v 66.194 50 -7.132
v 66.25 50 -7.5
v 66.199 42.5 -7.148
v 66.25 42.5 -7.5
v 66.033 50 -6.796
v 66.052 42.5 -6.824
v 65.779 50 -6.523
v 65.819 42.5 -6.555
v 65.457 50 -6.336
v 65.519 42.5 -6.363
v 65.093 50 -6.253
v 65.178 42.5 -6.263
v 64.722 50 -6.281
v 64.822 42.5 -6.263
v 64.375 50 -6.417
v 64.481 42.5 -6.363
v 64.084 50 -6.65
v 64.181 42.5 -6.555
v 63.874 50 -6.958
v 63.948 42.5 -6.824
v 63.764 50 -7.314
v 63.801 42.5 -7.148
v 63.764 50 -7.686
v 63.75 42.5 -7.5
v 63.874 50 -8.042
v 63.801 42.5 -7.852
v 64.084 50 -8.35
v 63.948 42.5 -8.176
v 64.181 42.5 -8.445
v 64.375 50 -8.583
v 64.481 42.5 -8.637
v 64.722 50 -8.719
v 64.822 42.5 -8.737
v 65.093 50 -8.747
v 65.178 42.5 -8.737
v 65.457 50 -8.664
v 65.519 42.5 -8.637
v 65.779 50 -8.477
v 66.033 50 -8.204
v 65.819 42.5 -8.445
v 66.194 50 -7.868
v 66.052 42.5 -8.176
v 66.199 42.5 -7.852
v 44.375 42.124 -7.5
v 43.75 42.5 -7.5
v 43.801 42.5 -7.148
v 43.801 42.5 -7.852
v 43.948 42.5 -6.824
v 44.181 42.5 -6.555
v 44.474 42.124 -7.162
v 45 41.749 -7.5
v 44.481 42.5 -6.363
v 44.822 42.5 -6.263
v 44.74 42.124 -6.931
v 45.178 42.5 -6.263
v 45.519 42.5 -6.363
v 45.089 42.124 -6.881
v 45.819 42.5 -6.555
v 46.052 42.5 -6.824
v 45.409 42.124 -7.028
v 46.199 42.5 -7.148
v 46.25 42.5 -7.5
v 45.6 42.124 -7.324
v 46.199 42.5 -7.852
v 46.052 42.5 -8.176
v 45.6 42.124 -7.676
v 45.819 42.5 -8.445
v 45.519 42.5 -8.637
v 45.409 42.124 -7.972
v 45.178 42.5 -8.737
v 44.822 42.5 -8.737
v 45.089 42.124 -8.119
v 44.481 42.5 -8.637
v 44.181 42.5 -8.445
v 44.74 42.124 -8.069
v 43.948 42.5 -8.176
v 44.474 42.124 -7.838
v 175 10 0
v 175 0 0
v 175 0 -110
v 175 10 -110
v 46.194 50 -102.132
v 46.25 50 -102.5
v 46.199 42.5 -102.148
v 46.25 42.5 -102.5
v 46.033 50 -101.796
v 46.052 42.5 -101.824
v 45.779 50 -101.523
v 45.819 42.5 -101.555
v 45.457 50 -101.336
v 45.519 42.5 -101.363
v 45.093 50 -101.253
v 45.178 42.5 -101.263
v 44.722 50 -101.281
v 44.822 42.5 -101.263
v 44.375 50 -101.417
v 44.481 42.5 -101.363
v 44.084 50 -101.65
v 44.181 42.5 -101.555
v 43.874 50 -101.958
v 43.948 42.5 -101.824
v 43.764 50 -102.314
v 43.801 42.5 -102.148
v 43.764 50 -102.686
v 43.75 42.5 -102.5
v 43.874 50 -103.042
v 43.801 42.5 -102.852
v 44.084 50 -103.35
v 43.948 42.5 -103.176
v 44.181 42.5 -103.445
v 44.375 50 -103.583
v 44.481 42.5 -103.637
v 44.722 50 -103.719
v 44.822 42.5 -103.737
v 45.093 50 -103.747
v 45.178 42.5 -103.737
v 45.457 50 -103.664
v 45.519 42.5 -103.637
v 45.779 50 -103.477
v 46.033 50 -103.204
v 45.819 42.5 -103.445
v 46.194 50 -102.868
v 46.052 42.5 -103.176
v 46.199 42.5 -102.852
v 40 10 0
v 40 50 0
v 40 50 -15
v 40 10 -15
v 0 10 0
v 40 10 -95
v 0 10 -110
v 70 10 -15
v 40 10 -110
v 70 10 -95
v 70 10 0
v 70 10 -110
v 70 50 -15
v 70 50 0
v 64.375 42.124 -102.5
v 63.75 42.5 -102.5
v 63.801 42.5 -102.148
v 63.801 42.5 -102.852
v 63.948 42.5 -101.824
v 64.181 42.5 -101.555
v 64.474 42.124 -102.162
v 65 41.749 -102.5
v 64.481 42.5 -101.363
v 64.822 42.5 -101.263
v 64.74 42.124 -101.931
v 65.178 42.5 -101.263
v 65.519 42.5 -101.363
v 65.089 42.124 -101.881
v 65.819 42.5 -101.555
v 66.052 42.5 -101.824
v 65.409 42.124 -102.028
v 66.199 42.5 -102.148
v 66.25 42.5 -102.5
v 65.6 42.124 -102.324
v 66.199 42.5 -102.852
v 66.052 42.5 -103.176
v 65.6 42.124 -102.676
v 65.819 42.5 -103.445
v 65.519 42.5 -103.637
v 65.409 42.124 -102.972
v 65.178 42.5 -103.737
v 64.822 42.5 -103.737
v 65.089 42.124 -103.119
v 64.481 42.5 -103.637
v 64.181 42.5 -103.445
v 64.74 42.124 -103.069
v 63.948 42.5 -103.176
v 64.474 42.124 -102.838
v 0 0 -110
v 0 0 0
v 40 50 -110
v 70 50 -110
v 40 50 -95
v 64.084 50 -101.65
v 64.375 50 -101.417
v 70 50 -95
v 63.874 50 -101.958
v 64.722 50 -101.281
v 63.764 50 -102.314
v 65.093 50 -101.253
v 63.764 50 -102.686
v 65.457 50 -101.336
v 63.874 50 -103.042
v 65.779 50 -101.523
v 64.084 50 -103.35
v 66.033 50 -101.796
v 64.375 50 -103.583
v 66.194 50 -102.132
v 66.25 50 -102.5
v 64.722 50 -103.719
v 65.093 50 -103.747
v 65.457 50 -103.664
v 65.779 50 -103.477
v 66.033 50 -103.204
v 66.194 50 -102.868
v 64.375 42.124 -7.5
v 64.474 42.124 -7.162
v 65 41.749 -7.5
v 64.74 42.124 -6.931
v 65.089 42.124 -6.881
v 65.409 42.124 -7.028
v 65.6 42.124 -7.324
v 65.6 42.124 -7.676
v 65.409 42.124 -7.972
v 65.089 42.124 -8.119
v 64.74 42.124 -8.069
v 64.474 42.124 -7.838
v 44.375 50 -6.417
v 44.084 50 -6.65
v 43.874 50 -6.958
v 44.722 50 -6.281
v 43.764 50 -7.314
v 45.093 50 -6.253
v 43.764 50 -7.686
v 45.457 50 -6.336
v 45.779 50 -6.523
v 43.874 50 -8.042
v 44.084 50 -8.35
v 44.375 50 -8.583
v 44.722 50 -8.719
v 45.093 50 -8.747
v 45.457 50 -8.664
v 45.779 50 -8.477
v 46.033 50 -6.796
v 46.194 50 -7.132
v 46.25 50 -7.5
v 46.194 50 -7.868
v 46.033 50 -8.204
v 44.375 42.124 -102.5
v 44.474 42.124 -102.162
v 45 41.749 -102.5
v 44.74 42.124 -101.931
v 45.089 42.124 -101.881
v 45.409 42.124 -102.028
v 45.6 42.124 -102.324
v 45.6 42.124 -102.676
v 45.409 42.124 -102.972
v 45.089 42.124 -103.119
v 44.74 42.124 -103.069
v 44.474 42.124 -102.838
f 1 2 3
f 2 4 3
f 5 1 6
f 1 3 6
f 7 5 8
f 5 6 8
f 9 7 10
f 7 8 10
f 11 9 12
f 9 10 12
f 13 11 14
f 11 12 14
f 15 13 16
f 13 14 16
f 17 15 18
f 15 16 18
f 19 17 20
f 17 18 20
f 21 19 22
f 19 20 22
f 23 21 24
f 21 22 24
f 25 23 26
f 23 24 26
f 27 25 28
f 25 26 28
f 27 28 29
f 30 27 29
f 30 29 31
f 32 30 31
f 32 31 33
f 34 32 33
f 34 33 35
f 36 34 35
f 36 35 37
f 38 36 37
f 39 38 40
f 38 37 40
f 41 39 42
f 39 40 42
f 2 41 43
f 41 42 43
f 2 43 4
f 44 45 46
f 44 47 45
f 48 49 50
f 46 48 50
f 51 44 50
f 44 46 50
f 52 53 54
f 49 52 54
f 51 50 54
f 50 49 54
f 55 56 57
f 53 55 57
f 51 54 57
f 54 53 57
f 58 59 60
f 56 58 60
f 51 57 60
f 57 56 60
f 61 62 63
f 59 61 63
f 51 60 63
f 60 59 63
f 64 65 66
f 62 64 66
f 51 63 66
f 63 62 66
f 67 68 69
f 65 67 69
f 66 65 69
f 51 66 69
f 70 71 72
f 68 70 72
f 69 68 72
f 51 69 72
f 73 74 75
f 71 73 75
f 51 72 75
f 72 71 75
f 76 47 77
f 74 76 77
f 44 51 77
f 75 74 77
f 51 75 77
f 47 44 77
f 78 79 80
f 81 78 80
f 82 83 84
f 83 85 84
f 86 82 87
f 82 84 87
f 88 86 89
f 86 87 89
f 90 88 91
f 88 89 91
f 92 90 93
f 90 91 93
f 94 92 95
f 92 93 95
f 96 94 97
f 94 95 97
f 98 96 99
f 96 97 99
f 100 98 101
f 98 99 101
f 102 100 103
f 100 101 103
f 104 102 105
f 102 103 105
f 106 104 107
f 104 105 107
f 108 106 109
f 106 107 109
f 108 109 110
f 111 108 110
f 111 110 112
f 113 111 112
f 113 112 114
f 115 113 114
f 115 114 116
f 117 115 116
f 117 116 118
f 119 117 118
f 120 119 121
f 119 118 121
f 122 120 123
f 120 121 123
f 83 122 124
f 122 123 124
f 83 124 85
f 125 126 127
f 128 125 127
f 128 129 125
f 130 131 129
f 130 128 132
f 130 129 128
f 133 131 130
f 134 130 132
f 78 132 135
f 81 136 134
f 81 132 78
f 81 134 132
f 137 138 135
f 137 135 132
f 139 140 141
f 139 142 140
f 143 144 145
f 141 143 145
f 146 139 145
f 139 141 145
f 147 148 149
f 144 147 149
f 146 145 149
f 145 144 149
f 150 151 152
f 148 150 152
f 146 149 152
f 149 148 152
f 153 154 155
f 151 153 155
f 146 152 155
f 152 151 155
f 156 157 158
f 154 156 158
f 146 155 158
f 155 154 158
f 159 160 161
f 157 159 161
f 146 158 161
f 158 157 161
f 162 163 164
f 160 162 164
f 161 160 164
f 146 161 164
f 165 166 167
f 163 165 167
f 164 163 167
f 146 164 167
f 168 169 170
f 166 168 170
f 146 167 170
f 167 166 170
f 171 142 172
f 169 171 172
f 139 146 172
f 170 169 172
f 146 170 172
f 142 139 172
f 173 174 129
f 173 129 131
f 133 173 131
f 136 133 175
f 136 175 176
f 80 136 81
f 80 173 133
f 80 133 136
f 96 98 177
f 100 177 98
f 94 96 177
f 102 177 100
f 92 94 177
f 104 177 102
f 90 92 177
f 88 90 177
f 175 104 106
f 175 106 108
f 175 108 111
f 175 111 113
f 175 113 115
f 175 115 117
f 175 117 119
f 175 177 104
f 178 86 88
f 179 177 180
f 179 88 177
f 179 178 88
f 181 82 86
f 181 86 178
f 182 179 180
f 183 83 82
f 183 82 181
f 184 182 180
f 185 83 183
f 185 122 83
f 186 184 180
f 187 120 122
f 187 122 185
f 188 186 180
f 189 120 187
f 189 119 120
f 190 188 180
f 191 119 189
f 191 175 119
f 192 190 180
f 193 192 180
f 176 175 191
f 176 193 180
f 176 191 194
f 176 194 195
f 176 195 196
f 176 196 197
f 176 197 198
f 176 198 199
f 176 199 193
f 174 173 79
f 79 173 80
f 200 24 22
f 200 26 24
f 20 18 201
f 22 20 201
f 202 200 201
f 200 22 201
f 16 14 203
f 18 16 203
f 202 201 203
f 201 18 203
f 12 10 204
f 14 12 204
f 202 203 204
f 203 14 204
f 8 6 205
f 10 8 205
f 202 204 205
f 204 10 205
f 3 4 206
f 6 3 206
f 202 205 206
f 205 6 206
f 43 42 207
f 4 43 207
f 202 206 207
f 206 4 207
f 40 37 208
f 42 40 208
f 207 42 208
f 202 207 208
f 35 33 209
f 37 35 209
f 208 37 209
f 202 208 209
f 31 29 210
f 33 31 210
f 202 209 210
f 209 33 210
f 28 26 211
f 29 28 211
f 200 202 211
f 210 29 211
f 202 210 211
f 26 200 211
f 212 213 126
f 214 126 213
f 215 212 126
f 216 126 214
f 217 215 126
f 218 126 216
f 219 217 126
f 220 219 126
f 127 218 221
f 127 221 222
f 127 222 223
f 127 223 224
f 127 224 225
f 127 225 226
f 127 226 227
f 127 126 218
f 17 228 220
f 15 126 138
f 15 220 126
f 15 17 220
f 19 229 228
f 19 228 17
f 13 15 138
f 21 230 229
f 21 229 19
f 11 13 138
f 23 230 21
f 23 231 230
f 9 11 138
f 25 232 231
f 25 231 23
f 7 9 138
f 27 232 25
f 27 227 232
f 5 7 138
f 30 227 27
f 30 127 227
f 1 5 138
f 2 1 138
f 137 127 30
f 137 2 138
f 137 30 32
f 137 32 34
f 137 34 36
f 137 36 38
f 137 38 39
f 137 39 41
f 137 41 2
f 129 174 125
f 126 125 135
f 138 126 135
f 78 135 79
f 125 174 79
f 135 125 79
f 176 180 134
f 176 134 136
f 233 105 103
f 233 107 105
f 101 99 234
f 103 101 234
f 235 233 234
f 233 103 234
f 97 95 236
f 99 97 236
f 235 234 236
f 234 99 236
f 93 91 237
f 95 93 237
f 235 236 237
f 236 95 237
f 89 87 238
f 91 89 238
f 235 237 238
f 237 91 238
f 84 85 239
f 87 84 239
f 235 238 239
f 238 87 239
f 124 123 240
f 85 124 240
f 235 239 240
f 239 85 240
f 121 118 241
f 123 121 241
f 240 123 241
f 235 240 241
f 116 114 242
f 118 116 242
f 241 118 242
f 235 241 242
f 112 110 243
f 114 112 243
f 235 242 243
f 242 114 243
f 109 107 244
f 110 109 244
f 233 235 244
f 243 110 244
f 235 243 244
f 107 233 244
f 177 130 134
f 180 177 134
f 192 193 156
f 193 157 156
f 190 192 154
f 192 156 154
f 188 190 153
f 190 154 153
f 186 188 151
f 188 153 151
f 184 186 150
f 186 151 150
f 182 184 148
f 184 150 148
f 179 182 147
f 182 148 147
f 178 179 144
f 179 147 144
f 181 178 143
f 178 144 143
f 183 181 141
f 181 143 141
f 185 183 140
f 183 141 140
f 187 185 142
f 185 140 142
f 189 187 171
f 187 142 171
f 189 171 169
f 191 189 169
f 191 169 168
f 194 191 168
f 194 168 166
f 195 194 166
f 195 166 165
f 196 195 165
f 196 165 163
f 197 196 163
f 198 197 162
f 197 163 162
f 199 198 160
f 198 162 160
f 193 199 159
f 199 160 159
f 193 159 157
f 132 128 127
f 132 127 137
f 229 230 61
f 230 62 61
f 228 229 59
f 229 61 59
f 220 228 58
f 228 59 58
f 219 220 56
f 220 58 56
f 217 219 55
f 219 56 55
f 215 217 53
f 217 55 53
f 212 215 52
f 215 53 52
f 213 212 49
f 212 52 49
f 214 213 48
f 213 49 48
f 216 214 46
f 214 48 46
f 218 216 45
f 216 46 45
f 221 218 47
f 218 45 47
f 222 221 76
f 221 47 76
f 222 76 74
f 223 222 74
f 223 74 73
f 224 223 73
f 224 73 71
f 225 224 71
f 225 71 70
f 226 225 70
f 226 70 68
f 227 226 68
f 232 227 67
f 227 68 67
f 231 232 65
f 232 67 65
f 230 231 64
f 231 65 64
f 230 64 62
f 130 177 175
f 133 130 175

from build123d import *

# Parameters (mm, degrees)
SKETCH1_W                 = 175
SKETCH1_H                 = 110
BOSS_EXTRUDE1_DEPTH       = 10
SKETCH3_W                 = 30
SKETCH3_H                 = 15
BOSS_EXTRUDE2_DEPTH       = 40
M3X0_5_TAPPED_HOLE1_D     = 2.5
M3X0_5_TAPPED_HOLE1_DEPTH = 7.5
M3X0_5_TAPPED_HOLE1_TIP   = 0.751075774


with BuildPart() as part:
    # Sketch1 → Boss-Extrude1 (new body)
    with BuildSketch(Plane(origin=(0, 0, 0), x_dir=(1, 0, 0), z_dir=(0, 1, 0))):
        with Locations((87.5, 55)):
            Rectangle(SKETCH1_W, SKETCH1_H)
    extrude(amount=BOSS_EXTRUDE1_DEPTH)

    # Sketch3 → Boss-Extrude2 (add)
    with BuildSketch(Plane(origin=(0, 10, 0), x_dir=(1, 0, 0), z_dir=(0, 1, 0))):
        with Locations((55, 7.5)):
            Rectangle(SKETCH3_W, SKETCH3_H)
        with Locations((55, 102.5)):
            Rectangle(SKETCH3_W, SKETCH3_H)
    extrude(amount=BOSS_EXTRUDE2_DEPTH)

    # M3x0.5 Tapped Hole1
    with Locations(Plane(origin=(0, 50, 0), x_dir=(-1, 0, 0), z_dir=(0, 1, 0))):
        with Locations((-45, -7.5), (-65, -7.5), (-45, -102.5), (-65, -102.5)):
            Hole(M3X0_5_TAPPED_HOLE1_D / 2, depth=M3X0_5_TAPPED_HOLE1_DEPTH)
            with Locations((0, 0, -(M3X0_5_TAPPED_HOLE1_DEPTH + M3X0_5_TAPPED_HOLE1_TIP / 2))):  # 118° drill point
                Cone(0, M3X0_5_TAPPED_HOLE1_D / 2, M3X0_5_TAPPED_HOLE1_TIP, mode=Mode.SUBTRACT)


solid = part.part
